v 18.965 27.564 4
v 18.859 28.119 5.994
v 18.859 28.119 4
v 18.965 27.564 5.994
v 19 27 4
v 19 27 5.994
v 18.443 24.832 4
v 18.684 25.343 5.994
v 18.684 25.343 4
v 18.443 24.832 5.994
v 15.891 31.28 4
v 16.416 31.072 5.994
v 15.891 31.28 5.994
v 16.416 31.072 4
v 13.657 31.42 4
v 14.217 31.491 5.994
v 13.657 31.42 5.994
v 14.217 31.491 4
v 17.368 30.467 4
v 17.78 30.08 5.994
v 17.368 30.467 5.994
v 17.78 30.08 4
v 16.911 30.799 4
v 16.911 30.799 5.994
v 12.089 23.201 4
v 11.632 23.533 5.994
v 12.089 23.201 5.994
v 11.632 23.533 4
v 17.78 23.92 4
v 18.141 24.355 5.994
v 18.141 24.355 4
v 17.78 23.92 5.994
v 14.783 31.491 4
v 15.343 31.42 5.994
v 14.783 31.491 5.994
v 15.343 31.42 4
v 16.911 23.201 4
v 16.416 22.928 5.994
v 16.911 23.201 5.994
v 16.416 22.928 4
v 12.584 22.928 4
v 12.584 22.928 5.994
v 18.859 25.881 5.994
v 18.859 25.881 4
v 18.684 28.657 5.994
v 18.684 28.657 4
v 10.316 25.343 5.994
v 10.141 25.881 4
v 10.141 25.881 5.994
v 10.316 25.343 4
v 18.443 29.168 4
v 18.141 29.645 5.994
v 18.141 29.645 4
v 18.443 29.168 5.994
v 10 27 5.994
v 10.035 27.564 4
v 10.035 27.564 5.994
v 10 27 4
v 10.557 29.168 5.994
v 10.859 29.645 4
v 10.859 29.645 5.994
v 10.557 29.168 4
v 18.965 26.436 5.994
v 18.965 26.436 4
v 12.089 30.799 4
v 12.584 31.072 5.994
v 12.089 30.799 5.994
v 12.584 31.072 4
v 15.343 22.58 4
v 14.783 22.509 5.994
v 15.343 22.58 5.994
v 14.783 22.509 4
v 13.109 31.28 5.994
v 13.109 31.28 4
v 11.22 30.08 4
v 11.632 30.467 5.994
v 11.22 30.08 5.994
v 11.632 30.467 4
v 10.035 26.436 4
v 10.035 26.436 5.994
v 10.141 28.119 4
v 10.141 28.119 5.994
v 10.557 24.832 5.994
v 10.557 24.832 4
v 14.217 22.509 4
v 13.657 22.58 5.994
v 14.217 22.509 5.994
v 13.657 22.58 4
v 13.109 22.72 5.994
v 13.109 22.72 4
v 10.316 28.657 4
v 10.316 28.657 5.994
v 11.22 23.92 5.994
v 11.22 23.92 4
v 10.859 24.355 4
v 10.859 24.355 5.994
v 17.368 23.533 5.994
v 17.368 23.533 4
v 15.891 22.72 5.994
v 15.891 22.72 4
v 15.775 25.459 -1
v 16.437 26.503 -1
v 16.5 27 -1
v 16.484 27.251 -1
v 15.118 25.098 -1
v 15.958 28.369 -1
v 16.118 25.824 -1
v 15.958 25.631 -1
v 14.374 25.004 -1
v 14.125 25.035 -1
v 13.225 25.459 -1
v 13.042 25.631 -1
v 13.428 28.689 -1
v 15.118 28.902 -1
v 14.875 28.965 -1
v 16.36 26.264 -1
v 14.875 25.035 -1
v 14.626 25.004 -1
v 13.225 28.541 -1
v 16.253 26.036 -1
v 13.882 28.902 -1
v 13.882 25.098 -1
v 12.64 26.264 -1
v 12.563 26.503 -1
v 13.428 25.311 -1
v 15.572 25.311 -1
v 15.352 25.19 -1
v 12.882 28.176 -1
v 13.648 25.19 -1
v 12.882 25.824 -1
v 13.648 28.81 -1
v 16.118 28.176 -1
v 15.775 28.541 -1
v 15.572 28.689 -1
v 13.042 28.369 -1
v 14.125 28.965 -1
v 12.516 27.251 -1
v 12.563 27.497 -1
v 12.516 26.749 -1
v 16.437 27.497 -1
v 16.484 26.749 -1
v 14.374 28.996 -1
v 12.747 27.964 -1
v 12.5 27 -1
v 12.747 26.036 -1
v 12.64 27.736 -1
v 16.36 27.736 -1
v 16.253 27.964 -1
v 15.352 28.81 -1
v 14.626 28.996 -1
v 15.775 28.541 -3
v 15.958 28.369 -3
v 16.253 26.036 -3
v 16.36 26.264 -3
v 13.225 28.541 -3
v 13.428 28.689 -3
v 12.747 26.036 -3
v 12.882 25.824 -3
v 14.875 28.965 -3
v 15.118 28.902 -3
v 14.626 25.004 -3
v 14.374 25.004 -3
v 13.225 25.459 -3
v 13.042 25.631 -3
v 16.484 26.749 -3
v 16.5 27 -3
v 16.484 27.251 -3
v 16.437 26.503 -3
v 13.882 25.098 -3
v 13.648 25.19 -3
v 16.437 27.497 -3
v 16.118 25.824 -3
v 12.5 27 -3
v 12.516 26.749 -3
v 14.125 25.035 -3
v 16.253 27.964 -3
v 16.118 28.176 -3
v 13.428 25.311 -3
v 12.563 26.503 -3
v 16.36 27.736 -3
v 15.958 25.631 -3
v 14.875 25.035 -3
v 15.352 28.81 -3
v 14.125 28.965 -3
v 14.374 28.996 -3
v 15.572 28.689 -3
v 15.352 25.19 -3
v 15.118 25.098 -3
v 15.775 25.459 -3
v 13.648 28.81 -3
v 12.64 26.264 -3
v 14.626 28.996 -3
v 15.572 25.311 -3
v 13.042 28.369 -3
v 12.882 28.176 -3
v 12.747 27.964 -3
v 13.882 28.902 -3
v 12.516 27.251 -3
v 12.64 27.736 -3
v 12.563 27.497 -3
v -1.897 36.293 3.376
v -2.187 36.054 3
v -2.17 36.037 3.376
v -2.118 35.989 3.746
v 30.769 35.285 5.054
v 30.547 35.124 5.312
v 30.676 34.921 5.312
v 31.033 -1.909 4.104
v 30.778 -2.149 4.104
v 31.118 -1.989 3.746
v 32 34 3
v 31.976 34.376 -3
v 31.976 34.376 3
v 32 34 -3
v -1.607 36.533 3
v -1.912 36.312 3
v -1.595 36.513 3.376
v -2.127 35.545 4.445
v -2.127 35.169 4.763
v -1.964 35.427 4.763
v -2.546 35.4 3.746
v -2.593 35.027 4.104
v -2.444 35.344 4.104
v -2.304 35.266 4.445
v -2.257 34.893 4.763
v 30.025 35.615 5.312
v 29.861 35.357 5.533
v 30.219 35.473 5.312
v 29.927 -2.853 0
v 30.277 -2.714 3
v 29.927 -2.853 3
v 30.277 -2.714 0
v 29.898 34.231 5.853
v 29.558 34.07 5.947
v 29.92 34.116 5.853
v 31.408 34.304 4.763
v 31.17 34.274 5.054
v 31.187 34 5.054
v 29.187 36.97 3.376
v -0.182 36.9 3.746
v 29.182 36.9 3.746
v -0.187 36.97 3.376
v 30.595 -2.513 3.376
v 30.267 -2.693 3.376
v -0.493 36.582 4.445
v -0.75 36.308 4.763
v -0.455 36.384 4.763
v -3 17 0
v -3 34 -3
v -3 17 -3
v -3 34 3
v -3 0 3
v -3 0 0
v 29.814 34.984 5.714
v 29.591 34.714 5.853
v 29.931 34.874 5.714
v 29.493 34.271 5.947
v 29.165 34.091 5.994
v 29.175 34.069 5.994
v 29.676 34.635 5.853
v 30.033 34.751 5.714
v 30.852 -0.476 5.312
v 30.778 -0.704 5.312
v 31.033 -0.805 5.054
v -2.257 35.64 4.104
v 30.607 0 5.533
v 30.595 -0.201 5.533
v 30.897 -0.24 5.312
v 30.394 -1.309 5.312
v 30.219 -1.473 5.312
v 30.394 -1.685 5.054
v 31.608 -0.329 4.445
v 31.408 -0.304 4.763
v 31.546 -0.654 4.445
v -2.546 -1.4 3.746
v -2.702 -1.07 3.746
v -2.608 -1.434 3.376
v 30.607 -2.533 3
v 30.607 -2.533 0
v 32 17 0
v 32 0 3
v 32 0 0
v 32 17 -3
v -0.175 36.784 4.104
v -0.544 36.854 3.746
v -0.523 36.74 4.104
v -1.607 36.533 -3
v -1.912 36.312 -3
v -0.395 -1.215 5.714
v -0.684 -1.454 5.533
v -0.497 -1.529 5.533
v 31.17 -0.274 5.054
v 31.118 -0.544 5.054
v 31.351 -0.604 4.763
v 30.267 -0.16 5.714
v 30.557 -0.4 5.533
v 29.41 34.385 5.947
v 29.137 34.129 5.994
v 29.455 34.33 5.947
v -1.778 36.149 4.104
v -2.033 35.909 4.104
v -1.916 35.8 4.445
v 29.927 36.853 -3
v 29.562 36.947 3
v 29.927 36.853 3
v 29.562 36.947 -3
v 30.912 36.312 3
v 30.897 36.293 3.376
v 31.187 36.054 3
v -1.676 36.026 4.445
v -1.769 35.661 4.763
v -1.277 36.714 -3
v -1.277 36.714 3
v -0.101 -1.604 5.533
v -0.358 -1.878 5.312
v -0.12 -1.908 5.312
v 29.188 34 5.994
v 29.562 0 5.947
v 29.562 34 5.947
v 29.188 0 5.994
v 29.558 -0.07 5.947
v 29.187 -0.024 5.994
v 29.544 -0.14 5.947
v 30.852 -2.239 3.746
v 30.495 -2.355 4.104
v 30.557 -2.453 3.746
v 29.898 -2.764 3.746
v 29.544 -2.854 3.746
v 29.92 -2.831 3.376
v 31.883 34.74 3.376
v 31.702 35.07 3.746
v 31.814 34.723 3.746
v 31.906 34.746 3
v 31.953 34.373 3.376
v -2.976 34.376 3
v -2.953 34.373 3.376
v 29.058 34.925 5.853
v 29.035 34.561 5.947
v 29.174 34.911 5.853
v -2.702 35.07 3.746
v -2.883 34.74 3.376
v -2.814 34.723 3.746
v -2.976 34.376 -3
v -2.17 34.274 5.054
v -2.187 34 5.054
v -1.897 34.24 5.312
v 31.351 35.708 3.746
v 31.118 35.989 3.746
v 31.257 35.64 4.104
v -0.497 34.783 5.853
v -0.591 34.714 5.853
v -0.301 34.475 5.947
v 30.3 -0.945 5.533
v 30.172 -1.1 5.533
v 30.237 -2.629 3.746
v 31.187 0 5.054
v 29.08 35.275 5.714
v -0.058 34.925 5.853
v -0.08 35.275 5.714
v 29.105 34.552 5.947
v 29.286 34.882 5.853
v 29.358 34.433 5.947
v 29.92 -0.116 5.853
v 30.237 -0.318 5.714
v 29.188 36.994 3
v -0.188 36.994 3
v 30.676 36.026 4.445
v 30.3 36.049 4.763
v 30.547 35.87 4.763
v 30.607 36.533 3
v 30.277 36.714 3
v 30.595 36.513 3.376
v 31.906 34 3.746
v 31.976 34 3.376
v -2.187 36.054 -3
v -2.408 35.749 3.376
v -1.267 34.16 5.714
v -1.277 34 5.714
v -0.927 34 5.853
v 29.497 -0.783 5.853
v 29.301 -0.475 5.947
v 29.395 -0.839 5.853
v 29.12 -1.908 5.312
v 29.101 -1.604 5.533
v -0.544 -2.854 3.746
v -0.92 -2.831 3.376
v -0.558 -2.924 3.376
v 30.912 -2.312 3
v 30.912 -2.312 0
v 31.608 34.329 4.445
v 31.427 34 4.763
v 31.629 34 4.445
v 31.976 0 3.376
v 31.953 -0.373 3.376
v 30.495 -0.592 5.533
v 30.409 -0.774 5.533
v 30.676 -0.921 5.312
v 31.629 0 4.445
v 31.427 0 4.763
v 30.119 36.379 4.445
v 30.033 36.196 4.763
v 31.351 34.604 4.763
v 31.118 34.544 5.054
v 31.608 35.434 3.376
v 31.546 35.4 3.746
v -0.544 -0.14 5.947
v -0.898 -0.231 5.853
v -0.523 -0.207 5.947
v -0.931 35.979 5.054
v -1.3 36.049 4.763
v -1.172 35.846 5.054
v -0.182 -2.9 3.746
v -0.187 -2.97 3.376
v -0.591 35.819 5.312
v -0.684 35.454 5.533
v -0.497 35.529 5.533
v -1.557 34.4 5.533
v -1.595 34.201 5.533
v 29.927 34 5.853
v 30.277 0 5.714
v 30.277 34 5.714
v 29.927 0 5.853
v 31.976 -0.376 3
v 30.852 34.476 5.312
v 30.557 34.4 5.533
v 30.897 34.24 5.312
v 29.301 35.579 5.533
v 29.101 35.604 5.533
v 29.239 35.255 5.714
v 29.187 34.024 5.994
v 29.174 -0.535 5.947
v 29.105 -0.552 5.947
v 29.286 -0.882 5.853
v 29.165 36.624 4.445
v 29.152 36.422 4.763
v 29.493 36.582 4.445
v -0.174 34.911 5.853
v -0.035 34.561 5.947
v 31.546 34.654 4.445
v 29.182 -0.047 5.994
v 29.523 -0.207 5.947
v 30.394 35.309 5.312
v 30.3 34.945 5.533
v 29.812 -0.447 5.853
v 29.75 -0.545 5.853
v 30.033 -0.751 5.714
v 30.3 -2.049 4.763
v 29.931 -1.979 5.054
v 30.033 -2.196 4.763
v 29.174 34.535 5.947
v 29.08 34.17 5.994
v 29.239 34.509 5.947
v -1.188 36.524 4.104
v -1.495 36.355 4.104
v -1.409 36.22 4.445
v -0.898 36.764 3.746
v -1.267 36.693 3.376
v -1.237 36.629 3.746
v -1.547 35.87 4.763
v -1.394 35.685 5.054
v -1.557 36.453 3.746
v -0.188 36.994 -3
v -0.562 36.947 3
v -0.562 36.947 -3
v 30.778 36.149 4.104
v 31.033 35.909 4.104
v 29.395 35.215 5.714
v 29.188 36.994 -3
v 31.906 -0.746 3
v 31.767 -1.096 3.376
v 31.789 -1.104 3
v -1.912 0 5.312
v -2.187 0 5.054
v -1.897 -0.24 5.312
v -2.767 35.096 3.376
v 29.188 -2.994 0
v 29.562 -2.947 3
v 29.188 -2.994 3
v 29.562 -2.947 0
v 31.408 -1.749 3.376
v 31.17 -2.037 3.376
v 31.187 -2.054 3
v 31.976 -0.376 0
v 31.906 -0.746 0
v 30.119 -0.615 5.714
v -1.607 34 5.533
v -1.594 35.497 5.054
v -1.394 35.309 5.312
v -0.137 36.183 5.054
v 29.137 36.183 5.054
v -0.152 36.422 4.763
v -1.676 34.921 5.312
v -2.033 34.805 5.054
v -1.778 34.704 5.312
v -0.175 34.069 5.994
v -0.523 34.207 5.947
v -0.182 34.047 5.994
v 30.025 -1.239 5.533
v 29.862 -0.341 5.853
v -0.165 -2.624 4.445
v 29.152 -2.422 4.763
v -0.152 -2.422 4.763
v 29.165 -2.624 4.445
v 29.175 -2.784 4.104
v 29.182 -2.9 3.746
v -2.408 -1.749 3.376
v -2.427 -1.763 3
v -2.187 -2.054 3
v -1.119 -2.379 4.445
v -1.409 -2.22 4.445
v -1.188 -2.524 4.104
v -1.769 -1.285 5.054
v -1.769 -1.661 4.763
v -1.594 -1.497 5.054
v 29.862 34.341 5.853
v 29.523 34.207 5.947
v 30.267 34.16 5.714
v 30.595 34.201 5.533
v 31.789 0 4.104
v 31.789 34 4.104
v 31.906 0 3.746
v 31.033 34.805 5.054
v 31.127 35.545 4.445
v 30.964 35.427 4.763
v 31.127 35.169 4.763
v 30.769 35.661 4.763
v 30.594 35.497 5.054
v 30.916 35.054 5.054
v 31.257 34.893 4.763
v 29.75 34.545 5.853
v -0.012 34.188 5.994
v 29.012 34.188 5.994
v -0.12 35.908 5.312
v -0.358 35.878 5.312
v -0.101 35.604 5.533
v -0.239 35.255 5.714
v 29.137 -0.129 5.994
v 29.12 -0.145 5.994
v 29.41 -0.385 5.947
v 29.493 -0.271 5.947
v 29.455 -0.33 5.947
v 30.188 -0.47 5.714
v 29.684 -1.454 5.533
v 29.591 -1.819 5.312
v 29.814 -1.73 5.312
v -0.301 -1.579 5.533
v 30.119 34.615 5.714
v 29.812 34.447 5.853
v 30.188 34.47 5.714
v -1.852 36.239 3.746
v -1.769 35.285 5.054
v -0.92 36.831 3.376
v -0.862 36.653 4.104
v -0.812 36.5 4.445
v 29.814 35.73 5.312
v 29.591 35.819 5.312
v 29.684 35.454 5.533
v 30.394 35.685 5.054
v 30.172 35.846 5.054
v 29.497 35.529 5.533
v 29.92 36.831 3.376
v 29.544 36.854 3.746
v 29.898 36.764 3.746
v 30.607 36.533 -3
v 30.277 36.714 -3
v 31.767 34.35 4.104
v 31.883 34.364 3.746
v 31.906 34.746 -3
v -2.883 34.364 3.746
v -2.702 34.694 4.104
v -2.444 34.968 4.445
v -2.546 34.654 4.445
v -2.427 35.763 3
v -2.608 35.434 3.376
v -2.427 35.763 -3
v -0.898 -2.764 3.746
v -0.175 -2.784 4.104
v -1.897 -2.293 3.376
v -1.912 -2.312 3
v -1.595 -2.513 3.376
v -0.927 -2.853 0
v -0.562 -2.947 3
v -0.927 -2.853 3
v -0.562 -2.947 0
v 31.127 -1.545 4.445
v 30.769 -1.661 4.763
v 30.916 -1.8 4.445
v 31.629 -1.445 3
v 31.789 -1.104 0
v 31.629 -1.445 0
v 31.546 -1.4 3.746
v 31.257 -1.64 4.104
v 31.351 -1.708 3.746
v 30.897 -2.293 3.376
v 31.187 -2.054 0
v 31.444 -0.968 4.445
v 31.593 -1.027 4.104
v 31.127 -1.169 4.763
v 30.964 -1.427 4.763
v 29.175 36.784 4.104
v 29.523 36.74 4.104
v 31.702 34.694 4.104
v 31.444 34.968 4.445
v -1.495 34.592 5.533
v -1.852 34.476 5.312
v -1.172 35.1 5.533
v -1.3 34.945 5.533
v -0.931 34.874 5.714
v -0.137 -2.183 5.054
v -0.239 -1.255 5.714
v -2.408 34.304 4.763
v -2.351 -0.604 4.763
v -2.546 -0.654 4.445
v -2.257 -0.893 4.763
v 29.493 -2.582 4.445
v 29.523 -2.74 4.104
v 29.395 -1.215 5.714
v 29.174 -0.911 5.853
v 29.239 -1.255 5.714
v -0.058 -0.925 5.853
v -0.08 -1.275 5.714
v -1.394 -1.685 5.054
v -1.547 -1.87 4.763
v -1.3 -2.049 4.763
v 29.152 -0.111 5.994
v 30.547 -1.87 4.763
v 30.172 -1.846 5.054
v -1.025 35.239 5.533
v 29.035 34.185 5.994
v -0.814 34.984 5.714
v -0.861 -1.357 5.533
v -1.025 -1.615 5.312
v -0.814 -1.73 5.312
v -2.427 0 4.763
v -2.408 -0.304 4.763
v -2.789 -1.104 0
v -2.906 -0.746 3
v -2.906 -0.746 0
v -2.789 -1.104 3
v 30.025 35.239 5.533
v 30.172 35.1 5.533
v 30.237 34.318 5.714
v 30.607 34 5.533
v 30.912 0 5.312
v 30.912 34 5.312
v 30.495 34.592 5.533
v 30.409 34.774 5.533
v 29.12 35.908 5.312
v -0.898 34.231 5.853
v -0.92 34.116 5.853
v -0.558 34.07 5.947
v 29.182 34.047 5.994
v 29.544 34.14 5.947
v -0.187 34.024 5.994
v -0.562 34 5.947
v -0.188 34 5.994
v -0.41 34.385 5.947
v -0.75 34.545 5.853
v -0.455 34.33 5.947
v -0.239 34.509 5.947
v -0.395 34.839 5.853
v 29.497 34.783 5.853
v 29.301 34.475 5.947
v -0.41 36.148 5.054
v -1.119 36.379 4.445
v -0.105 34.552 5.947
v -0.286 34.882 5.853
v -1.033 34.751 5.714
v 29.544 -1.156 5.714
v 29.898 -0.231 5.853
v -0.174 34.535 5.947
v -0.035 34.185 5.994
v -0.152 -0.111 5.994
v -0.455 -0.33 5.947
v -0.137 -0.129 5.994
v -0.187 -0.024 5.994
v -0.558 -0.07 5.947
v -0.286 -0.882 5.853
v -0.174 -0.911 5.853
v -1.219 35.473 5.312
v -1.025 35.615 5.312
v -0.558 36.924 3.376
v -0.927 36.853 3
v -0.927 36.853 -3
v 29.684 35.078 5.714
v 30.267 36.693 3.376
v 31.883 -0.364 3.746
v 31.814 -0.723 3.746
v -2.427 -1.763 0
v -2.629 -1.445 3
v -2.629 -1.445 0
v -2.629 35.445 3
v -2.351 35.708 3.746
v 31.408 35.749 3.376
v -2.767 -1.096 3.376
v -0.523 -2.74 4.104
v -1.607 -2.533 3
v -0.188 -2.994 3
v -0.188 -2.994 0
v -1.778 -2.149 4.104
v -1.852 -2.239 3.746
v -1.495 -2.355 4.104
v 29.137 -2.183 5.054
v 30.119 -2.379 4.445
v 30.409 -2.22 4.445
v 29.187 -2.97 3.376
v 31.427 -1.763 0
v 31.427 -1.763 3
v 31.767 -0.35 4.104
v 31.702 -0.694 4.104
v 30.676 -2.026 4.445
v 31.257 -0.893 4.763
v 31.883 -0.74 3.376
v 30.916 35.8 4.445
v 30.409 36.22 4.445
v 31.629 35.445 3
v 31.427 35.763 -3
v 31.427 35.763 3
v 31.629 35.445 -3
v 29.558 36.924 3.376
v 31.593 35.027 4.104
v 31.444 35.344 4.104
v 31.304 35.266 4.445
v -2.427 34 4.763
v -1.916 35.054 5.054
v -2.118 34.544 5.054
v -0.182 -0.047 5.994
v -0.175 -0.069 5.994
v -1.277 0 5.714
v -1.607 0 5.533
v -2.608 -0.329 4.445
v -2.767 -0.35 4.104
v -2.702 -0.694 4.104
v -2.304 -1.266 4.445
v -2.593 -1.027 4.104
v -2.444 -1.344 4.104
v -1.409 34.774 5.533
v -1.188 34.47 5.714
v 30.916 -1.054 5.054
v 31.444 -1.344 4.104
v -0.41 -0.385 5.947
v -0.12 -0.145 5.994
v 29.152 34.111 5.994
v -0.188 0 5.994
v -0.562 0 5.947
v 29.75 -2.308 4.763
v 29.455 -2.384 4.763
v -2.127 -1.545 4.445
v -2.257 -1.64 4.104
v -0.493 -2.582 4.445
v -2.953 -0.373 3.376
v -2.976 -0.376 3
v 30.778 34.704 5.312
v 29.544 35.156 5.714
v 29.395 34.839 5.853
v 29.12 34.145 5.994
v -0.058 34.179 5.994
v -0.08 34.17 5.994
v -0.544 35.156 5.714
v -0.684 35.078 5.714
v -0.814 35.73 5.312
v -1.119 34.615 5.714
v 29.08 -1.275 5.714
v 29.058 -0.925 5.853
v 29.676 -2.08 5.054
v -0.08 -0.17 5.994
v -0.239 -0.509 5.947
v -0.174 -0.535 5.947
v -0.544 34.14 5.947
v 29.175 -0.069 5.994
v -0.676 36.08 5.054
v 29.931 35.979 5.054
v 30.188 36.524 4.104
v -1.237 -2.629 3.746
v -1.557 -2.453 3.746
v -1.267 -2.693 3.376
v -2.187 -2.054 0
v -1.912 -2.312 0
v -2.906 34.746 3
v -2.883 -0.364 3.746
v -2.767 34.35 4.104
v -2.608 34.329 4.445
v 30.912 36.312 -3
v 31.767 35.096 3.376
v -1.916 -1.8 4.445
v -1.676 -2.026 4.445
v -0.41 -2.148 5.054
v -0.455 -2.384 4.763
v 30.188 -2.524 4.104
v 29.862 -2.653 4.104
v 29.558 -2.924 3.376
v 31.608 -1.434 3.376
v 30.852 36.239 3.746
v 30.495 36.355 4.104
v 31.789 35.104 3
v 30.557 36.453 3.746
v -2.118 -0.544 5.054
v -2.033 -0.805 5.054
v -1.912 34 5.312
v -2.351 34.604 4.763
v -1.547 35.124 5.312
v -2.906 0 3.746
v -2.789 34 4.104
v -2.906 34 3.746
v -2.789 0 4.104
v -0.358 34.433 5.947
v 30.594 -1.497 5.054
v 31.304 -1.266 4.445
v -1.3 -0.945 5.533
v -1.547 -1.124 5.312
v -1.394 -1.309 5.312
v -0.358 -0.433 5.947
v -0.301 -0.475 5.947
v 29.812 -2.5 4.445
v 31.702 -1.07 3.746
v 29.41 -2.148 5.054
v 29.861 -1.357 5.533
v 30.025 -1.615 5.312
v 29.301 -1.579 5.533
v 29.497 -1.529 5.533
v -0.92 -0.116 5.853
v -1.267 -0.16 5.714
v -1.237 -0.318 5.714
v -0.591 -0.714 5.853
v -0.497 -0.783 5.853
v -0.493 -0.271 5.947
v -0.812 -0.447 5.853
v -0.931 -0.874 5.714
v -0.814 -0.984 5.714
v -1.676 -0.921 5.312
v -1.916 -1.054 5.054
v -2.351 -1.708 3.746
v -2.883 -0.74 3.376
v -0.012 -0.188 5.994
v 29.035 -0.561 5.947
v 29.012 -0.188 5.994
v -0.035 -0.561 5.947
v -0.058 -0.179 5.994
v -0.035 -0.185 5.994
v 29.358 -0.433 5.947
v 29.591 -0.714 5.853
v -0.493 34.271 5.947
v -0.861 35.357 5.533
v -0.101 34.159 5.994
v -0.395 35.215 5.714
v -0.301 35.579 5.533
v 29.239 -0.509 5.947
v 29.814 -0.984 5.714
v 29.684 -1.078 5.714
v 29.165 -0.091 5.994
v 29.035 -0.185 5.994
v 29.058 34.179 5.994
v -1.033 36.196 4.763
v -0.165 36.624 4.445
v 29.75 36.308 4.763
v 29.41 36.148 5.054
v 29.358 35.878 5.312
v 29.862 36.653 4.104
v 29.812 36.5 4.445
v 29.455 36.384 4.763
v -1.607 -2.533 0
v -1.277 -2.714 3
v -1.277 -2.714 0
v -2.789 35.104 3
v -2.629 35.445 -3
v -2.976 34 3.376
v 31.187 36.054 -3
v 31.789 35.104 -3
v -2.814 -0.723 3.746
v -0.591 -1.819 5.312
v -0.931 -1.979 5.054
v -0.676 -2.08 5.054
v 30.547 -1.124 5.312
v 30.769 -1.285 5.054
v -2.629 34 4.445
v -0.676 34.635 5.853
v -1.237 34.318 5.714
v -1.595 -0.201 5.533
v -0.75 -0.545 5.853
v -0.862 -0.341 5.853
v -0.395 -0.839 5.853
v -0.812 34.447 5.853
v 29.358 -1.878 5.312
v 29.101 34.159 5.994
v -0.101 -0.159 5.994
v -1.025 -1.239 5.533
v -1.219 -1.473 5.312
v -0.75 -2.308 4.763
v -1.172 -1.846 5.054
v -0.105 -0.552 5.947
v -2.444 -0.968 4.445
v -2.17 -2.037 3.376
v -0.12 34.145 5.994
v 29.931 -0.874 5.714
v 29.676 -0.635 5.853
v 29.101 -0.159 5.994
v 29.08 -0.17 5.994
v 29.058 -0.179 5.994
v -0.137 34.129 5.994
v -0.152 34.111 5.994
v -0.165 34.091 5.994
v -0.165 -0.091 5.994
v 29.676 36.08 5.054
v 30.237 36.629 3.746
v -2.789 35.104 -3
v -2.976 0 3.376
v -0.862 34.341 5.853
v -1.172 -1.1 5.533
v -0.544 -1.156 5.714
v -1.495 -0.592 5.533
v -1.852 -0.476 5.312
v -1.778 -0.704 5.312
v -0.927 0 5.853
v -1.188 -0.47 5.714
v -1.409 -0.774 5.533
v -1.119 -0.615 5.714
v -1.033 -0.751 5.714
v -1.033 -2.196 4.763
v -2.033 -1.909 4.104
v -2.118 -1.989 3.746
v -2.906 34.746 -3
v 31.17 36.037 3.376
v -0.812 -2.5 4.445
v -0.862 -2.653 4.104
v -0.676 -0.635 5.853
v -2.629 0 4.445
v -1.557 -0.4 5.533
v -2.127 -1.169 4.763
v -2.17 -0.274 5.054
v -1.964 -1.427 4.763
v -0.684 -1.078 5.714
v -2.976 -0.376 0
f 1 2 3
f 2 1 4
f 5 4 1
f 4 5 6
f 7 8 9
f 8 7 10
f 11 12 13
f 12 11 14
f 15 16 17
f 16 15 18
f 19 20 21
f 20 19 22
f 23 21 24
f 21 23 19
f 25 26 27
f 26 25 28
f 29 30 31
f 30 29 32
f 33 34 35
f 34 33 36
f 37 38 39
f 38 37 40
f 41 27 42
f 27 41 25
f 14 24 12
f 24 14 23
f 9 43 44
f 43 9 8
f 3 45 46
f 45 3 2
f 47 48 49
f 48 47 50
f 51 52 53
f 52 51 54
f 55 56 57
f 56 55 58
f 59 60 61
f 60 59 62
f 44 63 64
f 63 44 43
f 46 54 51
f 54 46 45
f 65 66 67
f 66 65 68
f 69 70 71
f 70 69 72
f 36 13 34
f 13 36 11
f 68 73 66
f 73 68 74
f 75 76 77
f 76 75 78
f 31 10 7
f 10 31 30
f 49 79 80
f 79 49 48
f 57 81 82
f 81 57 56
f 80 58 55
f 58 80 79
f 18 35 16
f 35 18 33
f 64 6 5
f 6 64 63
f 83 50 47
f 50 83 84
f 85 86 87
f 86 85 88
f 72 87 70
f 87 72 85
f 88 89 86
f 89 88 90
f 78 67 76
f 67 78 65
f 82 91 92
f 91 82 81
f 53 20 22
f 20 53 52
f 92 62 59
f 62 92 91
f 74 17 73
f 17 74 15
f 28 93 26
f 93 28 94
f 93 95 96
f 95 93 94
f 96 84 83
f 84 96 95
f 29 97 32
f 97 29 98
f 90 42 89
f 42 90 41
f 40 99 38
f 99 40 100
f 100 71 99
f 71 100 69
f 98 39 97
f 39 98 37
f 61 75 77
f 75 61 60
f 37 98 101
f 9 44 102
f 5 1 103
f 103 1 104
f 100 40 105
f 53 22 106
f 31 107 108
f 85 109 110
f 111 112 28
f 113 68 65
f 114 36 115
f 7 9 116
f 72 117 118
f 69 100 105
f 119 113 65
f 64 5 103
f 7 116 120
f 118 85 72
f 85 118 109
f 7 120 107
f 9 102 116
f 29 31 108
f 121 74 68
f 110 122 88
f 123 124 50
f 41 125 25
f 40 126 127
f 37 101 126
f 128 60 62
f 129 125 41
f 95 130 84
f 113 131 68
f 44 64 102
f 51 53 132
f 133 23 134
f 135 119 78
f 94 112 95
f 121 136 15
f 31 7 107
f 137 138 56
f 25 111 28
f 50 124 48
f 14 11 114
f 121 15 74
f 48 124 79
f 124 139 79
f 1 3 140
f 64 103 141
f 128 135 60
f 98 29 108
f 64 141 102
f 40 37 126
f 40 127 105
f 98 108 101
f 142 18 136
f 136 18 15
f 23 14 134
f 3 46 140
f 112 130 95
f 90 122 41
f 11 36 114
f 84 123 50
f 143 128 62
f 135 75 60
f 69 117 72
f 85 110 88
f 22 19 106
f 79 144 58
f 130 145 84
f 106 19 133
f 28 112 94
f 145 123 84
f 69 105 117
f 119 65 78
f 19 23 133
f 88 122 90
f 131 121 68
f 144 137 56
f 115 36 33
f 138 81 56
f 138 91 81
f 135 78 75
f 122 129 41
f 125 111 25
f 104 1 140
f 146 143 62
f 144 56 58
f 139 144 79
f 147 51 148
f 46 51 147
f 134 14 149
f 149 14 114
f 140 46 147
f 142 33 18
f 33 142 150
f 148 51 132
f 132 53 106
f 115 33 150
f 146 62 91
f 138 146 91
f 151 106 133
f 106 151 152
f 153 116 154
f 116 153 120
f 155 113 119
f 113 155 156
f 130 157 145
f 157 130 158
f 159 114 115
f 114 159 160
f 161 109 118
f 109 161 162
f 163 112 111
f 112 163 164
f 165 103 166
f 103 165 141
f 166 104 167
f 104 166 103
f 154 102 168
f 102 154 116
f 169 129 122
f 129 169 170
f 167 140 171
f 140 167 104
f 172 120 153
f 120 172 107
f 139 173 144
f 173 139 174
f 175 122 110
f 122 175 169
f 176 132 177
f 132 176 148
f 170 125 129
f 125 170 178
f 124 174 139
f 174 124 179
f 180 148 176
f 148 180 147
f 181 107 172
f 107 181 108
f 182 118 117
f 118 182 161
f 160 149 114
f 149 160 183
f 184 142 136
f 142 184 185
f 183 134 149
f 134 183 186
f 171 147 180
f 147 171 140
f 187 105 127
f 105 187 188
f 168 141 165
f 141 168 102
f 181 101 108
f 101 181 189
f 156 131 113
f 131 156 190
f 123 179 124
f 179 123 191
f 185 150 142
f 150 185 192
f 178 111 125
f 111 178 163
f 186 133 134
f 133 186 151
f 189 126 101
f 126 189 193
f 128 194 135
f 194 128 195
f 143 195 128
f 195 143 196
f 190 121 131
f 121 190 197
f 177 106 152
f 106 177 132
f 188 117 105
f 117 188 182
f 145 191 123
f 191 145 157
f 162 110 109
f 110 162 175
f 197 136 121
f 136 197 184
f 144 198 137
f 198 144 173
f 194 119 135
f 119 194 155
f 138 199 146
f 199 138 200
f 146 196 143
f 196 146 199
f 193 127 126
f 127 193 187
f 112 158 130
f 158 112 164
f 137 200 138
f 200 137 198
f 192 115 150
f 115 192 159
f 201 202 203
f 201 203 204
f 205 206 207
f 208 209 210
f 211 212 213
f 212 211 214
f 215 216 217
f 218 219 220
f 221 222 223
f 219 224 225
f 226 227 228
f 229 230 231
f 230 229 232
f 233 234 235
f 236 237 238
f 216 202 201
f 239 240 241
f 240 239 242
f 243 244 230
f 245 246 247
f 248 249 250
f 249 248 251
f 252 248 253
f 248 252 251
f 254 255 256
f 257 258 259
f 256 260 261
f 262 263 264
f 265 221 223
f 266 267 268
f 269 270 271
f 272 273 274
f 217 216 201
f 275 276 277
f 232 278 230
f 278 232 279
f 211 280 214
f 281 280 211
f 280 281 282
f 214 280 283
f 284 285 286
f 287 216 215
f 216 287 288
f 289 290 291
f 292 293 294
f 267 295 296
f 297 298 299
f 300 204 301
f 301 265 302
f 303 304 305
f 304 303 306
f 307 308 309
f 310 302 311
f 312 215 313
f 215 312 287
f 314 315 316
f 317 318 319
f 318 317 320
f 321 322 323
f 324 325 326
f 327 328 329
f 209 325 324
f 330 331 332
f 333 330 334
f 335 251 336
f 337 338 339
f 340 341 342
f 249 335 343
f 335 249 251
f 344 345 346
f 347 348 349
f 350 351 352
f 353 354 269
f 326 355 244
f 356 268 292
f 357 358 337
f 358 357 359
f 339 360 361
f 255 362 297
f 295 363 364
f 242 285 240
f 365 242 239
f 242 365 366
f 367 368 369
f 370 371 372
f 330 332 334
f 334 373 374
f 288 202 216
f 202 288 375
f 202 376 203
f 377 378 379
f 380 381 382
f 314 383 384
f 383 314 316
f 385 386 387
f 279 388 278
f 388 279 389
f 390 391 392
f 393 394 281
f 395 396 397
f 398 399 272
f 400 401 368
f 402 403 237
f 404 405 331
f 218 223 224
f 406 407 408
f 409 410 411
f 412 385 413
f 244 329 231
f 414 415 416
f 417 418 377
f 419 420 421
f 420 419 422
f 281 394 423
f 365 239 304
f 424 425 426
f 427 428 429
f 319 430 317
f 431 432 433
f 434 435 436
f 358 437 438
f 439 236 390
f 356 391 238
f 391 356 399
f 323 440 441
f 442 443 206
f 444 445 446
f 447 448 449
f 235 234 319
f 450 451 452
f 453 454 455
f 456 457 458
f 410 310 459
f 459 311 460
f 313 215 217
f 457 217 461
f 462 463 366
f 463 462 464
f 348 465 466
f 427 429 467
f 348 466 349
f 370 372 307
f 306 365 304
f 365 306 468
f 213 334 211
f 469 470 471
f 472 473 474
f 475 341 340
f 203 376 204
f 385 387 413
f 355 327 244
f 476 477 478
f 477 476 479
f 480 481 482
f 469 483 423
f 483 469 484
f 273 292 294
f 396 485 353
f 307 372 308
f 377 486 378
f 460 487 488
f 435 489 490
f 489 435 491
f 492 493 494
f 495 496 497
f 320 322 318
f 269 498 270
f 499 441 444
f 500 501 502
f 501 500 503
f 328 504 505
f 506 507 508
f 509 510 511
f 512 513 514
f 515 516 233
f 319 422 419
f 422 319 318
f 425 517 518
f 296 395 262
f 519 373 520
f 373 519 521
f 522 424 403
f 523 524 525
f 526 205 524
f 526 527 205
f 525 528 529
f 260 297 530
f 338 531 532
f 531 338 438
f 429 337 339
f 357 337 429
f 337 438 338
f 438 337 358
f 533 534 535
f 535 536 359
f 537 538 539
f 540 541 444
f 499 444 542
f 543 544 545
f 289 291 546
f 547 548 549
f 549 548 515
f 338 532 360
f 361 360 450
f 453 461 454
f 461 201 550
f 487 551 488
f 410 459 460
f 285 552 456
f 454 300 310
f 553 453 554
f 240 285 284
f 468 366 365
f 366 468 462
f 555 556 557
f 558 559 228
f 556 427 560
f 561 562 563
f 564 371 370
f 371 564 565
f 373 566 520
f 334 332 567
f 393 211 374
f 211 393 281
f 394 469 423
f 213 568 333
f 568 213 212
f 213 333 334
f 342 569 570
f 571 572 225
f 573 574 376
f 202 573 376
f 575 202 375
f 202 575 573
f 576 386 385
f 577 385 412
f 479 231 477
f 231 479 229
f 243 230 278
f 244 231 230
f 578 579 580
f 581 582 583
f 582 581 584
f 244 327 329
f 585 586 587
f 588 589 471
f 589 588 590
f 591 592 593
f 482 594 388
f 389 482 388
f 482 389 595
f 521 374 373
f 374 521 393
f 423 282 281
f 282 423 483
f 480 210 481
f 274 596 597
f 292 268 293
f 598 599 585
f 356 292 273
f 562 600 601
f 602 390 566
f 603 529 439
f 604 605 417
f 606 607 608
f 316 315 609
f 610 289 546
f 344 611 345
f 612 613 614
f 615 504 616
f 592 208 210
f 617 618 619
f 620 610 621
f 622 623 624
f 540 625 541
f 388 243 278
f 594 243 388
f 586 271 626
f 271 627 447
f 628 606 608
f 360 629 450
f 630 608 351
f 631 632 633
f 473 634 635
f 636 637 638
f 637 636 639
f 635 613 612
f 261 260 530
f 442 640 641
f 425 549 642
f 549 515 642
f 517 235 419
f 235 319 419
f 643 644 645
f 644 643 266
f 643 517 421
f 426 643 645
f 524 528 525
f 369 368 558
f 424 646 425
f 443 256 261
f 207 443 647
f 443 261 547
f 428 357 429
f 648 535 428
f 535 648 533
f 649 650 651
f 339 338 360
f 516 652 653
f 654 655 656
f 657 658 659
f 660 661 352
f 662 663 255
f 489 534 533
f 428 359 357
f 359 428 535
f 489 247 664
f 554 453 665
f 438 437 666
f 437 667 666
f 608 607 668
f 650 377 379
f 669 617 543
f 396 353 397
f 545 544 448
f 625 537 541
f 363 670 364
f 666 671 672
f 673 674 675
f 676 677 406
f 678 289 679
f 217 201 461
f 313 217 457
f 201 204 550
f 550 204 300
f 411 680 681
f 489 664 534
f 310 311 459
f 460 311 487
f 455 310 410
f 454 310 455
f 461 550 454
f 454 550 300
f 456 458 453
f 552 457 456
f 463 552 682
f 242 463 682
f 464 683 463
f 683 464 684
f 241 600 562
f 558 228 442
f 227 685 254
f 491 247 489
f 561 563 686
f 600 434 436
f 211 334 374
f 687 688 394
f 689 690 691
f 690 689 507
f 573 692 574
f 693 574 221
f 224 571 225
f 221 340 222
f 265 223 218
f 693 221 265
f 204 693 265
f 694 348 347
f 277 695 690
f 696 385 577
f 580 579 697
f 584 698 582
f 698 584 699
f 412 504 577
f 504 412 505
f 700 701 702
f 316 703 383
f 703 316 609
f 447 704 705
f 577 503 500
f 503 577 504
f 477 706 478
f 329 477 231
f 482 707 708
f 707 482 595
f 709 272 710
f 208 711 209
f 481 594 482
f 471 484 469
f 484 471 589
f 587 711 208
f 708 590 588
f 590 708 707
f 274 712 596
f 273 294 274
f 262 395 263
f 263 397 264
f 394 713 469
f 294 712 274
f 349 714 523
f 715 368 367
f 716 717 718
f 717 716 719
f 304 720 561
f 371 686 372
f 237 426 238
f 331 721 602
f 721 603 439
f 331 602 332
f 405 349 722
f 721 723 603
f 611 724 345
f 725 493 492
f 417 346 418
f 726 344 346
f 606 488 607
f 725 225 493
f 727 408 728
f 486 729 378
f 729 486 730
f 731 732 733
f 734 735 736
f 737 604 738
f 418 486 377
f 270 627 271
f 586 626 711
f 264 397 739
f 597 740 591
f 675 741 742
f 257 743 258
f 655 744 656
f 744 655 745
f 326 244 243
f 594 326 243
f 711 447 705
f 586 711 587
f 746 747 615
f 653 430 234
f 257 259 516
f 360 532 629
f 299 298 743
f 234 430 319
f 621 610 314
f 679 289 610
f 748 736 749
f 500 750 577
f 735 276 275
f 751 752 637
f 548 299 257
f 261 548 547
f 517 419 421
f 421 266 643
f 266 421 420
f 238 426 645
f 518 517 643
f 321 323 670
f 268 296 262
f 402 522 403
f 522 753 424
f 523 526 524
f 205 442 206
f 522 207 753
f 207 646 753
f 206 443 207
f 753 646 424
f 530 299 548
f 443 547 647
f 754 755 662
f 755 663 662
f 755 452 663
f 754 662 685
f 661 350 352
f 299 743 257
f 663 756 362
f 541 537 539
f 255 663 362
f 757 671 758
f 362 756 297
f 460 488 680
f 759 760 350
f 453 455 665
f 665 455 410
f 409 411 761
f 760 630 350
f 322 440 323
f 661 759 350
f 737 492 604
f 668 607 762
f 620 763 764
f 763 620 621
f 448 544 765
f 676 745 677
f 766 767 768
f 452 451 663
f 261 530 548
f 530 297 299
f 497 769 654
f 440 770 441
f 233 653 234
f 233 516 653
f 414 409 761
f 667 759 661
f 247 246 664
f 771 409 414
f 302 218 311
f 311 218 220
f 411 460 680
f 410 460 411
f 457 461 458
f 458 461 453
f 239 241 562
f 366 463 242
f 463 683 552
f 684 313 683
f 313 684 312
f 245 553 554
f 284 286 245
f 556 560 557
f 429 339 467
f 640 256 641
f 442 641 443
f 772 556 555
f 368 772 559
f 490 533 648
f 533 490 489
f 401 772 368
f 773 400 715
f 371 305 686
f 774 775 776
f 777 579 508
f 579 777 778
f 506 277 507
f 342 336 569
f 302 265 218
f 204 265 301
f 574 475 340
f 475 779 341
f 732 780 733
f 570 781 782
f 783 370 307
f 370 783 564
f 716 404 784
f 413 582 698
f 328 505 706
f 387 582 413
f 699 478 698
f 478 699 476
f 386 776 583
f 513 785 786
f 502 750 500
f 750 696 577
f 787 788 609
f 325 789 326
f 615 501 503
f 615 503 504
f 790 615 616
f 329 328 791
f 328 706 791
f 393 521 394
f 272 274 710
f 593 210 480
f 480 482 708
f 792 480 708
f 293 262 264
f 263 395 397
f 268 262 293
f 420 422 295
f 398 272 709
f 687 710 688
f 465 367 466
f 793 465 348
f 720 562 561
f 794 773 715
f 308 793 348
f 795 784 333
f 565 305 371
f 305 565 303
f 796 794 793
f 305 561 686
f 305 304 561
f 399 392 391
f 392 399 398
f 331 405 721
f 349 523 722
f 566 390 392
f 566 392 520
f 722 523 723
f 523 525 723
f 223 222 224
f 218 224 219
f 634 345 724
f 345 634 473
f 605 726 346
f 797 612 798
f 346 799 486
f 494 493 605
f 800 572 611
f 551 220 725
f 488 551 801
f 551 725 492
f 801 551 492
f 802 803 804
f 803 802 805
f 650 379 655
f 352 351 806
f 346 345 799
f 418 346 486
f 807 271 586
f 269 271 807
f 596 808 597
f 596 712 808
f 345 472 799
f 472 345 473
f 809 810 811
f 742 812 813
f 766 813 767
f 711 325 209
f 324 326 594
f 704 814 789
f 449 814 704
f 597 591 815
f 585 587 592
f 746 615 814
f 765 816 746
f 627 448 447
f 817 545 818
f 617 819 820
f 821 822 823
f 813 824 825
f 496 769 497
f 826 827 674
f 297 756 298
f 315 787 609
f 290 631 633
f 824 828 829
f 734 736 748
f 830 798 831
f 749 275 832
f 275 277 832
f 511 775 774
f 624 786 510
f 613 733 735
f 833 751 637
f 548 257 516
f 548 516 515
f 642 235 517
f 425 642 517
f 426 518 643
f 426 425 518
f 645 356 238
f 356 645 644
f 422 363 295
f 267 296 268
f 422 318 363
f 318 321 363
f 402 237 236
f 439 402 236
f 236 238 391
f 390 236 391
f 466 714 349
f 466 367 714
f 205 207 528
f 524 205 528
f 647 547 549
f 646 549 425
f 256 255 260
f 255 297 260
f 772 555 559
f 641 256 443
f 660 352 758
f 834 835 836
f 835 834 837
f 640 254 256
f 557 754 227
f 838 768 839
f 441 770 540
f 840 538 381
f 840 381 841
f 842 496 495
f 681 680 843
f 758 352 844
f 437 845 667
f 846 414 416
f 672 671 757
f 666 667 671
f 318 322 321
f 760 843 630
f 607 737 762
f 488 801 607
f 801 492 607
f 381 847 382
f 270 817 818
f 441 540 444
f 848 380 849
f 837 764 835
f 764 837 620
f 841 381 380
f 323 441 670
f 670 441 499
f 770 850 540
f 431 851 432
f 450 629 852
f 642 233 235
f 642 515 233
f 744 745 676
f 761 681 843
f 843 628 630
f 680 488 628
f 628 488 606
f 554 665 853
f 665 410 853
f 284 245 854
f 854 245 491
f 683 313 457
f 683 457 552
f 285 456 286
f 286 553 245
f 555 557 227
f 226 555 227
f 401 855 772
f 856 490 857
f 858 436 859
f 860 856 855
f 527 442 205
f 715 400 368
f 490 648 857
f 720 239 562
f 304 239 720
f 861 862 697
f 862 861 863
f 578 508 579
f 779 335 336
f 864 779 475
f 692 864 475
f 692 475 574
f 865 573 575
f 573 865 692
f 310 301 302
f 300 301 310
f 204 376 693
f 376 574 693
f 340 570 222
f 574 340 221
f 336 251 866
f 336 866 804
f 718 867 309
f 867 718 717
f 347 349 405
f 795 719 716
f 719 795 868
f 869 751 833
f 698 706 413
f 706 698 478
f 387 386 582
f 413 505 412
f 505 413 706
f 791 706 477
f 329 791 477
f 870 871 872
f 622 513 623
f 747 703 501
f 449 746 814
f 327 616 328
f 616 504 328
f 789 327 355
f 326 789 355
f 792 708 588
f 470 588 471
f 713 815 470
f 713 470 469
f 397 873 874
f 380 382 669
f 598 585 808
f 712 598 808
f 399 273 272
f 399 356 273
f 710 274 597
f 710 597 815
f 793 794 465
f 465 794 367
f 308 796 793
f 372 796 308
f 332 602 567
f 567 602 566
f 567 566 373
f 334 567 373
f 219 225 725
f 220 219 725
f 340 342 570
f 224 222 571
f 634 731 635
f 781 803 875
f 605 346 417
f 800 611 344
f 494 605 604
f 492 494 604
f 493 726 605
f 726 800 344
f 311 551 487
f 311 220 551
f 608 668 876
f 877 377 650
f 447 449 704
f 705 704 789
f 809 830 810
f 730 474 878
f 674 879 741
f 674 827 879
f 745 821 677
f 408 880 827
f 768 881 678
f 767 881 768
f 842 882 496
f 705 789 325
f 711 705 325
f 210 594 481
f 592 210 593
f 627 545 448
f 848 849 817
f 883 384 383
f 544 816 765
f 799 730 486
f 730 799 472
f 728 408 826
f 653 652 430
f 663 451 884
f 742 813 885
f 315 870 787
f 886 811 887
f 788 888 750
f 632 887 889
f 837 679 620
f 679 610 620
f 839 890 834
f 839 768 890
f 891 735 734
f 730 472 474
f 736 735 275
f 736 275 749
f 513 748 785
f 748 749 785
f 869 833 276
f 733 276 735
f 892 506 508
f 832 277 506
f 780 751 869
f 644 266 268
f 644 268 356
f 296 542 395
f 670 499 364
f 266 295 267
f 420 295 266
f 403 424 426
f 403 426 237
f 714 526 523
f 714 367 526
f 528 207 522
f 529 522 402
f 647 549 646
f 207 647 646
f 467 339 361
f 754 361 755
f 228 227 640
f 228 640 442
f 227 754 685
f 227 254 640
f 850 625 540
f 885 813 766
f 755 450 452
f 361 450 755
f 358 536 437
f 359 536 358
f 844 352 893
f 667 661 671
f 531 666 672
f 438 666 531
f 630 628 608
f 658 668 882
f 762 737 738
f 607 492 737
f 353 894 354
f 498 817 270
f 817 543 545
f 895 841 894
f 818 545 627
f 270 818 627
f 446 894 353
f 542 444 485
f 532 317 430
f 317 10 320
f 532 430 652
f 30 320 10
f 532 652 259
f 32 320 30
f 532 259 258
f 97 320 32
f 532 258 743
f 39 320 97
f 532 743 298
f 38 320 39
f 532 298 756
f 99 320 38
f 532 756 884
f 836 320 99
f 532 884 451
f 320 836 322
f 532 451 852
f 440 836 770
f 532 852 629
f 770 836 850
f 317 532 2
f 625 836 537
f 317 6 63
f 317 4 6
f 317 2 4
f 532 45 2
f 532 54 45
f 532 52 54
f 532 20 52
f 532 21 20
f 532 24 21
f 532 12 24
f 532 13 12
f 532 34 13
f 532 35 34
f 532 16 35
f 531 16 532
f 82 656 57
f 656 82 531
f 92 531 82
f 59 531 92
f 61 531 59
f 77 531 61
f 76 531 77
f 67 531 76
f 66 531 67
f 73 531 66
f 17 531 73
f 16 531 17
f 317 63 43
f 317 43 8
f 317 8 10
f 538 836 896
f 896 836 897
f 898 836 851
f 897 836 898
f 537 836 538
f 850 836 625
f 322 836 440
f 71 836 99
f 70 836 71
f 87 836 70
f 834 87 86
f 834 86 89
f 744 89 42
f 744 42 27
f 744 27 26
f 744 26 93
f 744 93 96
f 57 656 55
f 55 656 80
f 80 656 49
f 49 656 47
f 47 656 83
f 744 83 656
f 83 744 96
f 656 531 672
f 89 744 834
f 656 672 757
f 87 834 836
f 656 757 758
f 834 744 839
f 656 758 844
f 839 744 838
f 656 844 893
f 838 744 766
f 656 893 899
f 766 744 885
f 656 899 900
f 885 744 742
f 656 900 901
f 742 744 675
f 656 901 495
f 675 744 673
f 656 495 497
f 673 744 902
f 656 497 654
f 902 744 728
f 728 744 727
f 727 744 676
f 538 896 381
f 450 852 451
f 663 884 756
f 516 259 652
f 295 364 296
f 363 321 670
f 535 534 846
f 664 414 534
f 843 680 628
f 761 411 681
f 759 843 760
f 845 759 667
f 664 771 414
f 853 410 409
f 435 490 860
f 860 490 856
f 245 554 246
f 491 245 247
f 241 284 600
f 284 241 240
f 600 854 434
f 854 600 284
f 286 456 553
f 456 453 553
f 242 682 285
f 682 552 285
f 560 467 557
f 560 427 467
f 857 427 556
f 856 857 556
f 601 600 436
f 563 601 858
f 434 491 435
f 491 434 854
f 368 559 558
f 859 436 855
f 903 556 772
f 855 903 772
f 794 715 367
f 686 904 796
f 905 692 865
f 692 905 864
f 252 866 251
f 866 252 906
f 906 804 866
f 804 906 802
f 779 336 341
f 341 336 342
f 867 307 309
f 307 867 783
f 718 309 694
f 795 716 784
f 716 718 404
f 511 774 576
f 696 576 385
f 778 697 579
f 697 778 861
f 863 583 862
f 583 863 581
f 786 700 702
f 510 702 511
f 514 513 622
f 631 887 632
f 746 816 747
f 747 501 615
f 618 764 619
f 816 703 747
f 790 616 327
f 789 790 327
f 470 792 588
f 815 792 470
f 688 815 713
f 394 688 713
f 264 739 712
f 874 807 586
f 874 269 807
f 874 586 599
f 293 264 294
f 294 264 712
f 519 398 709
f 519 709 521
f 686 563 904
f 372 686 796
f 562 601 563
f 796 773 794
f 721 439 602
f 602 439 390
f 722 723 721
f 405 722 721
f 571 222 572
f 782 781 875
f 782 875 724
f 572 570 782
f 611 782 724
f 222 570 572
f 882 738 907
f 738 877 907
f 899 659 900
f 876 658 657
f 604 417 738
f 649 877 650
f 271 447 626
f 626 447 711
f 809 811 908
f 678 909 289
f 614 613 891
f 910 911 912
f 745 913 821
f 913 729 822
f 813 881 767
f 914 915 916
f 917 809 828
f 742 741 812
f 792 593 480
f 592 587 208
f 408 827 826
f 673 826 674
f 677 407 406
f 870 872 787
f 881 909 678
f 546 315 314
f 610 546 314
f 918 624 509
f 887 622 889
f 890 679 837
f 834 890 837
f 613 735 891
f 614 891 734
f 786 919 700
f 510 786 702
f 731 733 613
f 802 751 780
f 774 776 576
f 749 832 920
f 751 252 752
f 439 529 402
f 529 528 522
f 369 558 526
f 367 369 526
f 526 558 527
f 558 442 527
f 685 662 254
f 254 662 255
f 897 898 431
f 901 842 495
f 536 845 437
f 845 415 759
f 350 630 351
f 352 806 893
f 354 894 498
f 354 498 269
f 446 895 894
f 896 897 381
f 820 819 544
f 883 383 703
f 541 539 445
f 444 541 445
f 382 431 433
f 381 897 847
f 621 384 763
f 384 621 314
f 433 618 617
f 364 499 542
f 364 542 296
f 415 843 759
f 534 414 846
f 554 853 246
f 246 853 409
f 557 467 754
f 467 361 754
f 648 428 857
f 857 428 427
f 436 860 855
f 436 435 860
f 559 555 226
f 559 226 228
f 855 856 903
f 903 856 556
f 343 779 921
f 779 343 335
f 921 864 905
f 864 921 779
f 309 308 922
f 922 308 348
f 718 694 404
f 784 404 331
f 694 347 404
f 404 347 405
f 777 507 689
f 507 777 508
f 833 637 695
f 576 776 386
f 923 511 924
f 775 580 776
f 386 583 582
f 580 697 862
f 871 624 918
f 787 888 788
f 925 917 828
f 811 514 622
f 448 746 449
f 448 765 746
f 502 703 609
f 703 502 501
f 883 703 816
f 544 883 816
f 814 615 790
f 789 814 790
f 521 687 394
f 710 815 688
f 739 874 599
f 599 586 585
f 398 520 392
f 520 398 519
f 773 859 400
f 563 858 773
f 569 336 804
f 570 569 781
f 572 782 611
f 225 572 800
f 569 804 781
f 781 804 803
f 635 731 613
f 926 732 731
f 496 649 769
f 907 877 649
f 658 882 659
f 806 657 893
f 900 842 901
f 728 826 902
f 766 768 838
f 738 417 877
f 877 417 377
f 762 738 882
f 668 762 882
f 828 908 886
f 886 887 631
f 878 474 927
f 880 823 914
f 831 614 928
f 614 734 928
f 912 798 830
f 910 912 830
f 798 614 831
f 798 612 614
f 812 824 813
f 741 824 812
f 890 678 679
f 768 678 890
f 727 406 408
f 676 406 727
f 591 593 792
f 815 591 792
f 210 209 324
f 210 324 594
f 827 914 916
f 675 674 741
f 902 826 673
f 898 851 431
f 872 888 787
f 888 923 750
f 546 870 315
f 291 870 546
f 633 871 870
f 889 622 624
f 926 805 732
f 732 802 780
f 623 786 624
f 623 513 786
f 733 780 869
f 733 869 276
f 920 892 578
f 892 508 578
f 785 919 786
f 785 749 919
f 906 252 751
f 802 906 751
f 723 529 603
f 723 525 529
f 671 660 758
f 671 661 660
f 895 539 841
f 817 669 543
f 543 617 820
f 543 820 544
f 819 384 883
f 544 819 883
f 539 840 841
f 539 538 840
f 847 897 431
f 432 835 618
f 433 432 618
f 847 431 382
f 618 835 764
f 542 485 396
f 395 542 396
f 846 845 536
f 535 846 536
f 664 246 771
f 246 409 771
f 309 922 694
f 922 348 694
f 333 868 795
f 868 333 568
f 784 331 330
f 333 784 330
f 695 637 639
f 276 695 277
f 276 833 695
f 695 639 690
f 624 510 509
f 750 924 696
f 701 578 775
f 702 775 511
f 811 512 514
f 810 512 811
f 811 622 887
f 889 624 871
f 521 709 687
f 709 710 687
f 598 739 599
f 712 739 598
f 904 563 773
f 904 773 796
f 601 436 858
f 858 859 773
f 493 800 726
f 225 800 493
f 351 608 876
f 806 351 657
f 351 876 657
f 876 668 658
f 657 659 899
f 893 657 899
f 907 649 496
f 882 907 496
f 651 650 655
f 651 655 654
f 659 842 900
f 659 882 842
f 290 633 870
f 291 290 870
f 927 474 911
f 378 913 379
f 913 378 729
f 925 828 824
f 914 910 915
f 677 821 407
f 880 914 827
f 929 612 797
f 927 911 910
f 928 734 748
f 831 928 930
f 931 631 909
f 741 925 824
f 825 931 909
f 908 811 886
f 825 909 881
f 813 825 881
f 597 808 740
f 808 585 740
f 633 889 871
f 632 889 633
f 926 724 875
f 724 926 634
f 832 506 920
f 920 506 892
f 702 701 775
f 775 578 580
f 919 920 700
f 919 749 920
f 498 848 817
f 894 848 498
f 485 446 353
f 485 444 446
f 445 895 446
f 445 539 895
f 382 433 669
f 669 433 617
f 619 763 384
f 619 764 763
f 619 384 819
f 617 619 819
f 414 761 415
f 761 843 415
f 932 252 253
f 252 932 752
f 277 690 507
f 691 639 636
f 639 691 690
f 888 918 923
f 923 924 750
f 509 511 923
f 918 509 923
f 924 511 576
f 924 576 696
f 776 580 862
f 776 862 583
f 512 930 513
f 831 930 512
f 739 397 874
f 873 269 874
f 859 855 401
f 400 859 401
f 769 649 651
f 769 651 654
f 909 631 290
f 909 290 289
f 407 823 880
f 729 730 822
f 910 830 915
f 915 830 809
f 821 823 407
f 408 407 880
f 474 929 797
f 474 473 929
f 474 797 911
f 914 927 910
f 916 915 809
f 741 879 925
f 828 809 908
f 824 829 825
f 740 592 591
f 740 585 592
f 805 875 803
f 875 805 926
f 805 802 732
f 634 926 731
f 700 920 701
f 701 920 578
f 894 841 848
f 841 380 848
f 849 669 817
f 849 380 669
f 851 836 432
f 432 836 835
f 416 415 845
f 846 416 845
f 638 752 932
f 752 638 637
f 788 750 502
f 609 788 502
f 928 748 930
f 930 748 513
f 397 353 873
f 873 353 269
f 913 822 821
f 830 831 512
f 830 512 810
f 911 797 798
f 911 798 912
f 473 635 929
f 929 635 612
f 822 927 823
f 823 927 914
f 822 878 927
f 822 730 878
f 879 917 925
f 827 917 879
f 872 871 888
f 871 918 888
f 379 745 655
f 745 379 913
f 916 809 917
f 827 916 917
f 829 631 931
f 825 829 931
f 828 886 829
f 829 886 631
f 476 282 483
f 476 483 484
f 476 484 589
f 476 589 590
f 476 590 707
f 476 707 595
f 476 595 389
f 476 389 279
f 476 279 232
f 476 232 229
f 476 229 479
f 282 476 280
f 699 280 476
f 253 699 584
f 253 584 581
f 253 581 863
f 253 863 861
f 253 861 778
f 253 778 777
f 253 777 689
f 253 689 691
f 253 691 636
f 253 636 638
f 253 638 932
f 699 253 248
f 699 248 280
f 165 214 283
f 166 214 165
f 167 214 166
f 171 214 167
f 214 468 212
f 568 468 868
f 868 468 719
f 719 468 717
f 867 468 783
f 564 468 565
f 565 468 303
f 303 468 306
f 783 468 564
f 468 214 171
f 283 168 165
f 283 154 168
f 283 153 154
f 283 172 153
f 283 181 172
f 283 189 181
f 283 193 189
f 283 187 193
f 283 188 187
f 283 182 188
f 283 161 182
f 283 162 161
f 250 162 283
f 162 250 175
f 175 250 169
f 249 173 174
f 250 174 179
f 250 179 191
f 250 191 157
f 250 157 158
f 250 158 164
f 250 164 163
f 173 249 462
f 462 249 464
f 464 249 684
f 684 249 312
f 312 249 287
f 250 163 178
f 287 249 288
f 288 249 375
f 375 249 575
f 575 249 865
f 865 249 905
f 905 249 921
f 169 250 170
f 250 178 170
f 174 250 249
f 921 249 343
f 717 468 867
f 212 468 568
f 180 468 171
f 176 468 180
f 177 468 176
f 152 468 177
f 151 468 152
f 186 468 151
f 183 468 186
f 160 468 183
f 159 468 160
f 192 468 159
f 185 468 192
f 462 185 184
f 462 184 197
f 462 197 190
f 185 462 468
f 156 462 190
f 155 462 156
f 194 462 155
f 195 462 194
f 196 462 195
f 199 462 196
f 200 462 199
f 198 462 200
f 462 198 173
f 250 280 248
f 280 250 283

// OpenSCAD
$fn=50;
width=35;
board_thickness=3;
tab_length=20;
body_length=20;
total_thickness=9;

difference(){
  minkowski(){
    translate([0,0,-6])
    cube([width-6, tab_length+body_length-6,total_thickness]);
      sphere(r=3);
  }
  translate([-3,-3,-3])
  cube([width, tab_length, board_thickness]);
  
  translate([-3,-3,-9])
  cube([width, tab_length+body_length, 6]);
  
  translate([(width/2)-3,(body_length/2)-3+tab_length,0]) {
    translate([0,0,+4]){cylinder(h=2,r=4.5);}
    translate([0,0,-1]){cylinder(h=5,r1=2,r2=4.5);}
    translate([0,0,-6]){cylinder(h=12,r=2);}
  }
}
